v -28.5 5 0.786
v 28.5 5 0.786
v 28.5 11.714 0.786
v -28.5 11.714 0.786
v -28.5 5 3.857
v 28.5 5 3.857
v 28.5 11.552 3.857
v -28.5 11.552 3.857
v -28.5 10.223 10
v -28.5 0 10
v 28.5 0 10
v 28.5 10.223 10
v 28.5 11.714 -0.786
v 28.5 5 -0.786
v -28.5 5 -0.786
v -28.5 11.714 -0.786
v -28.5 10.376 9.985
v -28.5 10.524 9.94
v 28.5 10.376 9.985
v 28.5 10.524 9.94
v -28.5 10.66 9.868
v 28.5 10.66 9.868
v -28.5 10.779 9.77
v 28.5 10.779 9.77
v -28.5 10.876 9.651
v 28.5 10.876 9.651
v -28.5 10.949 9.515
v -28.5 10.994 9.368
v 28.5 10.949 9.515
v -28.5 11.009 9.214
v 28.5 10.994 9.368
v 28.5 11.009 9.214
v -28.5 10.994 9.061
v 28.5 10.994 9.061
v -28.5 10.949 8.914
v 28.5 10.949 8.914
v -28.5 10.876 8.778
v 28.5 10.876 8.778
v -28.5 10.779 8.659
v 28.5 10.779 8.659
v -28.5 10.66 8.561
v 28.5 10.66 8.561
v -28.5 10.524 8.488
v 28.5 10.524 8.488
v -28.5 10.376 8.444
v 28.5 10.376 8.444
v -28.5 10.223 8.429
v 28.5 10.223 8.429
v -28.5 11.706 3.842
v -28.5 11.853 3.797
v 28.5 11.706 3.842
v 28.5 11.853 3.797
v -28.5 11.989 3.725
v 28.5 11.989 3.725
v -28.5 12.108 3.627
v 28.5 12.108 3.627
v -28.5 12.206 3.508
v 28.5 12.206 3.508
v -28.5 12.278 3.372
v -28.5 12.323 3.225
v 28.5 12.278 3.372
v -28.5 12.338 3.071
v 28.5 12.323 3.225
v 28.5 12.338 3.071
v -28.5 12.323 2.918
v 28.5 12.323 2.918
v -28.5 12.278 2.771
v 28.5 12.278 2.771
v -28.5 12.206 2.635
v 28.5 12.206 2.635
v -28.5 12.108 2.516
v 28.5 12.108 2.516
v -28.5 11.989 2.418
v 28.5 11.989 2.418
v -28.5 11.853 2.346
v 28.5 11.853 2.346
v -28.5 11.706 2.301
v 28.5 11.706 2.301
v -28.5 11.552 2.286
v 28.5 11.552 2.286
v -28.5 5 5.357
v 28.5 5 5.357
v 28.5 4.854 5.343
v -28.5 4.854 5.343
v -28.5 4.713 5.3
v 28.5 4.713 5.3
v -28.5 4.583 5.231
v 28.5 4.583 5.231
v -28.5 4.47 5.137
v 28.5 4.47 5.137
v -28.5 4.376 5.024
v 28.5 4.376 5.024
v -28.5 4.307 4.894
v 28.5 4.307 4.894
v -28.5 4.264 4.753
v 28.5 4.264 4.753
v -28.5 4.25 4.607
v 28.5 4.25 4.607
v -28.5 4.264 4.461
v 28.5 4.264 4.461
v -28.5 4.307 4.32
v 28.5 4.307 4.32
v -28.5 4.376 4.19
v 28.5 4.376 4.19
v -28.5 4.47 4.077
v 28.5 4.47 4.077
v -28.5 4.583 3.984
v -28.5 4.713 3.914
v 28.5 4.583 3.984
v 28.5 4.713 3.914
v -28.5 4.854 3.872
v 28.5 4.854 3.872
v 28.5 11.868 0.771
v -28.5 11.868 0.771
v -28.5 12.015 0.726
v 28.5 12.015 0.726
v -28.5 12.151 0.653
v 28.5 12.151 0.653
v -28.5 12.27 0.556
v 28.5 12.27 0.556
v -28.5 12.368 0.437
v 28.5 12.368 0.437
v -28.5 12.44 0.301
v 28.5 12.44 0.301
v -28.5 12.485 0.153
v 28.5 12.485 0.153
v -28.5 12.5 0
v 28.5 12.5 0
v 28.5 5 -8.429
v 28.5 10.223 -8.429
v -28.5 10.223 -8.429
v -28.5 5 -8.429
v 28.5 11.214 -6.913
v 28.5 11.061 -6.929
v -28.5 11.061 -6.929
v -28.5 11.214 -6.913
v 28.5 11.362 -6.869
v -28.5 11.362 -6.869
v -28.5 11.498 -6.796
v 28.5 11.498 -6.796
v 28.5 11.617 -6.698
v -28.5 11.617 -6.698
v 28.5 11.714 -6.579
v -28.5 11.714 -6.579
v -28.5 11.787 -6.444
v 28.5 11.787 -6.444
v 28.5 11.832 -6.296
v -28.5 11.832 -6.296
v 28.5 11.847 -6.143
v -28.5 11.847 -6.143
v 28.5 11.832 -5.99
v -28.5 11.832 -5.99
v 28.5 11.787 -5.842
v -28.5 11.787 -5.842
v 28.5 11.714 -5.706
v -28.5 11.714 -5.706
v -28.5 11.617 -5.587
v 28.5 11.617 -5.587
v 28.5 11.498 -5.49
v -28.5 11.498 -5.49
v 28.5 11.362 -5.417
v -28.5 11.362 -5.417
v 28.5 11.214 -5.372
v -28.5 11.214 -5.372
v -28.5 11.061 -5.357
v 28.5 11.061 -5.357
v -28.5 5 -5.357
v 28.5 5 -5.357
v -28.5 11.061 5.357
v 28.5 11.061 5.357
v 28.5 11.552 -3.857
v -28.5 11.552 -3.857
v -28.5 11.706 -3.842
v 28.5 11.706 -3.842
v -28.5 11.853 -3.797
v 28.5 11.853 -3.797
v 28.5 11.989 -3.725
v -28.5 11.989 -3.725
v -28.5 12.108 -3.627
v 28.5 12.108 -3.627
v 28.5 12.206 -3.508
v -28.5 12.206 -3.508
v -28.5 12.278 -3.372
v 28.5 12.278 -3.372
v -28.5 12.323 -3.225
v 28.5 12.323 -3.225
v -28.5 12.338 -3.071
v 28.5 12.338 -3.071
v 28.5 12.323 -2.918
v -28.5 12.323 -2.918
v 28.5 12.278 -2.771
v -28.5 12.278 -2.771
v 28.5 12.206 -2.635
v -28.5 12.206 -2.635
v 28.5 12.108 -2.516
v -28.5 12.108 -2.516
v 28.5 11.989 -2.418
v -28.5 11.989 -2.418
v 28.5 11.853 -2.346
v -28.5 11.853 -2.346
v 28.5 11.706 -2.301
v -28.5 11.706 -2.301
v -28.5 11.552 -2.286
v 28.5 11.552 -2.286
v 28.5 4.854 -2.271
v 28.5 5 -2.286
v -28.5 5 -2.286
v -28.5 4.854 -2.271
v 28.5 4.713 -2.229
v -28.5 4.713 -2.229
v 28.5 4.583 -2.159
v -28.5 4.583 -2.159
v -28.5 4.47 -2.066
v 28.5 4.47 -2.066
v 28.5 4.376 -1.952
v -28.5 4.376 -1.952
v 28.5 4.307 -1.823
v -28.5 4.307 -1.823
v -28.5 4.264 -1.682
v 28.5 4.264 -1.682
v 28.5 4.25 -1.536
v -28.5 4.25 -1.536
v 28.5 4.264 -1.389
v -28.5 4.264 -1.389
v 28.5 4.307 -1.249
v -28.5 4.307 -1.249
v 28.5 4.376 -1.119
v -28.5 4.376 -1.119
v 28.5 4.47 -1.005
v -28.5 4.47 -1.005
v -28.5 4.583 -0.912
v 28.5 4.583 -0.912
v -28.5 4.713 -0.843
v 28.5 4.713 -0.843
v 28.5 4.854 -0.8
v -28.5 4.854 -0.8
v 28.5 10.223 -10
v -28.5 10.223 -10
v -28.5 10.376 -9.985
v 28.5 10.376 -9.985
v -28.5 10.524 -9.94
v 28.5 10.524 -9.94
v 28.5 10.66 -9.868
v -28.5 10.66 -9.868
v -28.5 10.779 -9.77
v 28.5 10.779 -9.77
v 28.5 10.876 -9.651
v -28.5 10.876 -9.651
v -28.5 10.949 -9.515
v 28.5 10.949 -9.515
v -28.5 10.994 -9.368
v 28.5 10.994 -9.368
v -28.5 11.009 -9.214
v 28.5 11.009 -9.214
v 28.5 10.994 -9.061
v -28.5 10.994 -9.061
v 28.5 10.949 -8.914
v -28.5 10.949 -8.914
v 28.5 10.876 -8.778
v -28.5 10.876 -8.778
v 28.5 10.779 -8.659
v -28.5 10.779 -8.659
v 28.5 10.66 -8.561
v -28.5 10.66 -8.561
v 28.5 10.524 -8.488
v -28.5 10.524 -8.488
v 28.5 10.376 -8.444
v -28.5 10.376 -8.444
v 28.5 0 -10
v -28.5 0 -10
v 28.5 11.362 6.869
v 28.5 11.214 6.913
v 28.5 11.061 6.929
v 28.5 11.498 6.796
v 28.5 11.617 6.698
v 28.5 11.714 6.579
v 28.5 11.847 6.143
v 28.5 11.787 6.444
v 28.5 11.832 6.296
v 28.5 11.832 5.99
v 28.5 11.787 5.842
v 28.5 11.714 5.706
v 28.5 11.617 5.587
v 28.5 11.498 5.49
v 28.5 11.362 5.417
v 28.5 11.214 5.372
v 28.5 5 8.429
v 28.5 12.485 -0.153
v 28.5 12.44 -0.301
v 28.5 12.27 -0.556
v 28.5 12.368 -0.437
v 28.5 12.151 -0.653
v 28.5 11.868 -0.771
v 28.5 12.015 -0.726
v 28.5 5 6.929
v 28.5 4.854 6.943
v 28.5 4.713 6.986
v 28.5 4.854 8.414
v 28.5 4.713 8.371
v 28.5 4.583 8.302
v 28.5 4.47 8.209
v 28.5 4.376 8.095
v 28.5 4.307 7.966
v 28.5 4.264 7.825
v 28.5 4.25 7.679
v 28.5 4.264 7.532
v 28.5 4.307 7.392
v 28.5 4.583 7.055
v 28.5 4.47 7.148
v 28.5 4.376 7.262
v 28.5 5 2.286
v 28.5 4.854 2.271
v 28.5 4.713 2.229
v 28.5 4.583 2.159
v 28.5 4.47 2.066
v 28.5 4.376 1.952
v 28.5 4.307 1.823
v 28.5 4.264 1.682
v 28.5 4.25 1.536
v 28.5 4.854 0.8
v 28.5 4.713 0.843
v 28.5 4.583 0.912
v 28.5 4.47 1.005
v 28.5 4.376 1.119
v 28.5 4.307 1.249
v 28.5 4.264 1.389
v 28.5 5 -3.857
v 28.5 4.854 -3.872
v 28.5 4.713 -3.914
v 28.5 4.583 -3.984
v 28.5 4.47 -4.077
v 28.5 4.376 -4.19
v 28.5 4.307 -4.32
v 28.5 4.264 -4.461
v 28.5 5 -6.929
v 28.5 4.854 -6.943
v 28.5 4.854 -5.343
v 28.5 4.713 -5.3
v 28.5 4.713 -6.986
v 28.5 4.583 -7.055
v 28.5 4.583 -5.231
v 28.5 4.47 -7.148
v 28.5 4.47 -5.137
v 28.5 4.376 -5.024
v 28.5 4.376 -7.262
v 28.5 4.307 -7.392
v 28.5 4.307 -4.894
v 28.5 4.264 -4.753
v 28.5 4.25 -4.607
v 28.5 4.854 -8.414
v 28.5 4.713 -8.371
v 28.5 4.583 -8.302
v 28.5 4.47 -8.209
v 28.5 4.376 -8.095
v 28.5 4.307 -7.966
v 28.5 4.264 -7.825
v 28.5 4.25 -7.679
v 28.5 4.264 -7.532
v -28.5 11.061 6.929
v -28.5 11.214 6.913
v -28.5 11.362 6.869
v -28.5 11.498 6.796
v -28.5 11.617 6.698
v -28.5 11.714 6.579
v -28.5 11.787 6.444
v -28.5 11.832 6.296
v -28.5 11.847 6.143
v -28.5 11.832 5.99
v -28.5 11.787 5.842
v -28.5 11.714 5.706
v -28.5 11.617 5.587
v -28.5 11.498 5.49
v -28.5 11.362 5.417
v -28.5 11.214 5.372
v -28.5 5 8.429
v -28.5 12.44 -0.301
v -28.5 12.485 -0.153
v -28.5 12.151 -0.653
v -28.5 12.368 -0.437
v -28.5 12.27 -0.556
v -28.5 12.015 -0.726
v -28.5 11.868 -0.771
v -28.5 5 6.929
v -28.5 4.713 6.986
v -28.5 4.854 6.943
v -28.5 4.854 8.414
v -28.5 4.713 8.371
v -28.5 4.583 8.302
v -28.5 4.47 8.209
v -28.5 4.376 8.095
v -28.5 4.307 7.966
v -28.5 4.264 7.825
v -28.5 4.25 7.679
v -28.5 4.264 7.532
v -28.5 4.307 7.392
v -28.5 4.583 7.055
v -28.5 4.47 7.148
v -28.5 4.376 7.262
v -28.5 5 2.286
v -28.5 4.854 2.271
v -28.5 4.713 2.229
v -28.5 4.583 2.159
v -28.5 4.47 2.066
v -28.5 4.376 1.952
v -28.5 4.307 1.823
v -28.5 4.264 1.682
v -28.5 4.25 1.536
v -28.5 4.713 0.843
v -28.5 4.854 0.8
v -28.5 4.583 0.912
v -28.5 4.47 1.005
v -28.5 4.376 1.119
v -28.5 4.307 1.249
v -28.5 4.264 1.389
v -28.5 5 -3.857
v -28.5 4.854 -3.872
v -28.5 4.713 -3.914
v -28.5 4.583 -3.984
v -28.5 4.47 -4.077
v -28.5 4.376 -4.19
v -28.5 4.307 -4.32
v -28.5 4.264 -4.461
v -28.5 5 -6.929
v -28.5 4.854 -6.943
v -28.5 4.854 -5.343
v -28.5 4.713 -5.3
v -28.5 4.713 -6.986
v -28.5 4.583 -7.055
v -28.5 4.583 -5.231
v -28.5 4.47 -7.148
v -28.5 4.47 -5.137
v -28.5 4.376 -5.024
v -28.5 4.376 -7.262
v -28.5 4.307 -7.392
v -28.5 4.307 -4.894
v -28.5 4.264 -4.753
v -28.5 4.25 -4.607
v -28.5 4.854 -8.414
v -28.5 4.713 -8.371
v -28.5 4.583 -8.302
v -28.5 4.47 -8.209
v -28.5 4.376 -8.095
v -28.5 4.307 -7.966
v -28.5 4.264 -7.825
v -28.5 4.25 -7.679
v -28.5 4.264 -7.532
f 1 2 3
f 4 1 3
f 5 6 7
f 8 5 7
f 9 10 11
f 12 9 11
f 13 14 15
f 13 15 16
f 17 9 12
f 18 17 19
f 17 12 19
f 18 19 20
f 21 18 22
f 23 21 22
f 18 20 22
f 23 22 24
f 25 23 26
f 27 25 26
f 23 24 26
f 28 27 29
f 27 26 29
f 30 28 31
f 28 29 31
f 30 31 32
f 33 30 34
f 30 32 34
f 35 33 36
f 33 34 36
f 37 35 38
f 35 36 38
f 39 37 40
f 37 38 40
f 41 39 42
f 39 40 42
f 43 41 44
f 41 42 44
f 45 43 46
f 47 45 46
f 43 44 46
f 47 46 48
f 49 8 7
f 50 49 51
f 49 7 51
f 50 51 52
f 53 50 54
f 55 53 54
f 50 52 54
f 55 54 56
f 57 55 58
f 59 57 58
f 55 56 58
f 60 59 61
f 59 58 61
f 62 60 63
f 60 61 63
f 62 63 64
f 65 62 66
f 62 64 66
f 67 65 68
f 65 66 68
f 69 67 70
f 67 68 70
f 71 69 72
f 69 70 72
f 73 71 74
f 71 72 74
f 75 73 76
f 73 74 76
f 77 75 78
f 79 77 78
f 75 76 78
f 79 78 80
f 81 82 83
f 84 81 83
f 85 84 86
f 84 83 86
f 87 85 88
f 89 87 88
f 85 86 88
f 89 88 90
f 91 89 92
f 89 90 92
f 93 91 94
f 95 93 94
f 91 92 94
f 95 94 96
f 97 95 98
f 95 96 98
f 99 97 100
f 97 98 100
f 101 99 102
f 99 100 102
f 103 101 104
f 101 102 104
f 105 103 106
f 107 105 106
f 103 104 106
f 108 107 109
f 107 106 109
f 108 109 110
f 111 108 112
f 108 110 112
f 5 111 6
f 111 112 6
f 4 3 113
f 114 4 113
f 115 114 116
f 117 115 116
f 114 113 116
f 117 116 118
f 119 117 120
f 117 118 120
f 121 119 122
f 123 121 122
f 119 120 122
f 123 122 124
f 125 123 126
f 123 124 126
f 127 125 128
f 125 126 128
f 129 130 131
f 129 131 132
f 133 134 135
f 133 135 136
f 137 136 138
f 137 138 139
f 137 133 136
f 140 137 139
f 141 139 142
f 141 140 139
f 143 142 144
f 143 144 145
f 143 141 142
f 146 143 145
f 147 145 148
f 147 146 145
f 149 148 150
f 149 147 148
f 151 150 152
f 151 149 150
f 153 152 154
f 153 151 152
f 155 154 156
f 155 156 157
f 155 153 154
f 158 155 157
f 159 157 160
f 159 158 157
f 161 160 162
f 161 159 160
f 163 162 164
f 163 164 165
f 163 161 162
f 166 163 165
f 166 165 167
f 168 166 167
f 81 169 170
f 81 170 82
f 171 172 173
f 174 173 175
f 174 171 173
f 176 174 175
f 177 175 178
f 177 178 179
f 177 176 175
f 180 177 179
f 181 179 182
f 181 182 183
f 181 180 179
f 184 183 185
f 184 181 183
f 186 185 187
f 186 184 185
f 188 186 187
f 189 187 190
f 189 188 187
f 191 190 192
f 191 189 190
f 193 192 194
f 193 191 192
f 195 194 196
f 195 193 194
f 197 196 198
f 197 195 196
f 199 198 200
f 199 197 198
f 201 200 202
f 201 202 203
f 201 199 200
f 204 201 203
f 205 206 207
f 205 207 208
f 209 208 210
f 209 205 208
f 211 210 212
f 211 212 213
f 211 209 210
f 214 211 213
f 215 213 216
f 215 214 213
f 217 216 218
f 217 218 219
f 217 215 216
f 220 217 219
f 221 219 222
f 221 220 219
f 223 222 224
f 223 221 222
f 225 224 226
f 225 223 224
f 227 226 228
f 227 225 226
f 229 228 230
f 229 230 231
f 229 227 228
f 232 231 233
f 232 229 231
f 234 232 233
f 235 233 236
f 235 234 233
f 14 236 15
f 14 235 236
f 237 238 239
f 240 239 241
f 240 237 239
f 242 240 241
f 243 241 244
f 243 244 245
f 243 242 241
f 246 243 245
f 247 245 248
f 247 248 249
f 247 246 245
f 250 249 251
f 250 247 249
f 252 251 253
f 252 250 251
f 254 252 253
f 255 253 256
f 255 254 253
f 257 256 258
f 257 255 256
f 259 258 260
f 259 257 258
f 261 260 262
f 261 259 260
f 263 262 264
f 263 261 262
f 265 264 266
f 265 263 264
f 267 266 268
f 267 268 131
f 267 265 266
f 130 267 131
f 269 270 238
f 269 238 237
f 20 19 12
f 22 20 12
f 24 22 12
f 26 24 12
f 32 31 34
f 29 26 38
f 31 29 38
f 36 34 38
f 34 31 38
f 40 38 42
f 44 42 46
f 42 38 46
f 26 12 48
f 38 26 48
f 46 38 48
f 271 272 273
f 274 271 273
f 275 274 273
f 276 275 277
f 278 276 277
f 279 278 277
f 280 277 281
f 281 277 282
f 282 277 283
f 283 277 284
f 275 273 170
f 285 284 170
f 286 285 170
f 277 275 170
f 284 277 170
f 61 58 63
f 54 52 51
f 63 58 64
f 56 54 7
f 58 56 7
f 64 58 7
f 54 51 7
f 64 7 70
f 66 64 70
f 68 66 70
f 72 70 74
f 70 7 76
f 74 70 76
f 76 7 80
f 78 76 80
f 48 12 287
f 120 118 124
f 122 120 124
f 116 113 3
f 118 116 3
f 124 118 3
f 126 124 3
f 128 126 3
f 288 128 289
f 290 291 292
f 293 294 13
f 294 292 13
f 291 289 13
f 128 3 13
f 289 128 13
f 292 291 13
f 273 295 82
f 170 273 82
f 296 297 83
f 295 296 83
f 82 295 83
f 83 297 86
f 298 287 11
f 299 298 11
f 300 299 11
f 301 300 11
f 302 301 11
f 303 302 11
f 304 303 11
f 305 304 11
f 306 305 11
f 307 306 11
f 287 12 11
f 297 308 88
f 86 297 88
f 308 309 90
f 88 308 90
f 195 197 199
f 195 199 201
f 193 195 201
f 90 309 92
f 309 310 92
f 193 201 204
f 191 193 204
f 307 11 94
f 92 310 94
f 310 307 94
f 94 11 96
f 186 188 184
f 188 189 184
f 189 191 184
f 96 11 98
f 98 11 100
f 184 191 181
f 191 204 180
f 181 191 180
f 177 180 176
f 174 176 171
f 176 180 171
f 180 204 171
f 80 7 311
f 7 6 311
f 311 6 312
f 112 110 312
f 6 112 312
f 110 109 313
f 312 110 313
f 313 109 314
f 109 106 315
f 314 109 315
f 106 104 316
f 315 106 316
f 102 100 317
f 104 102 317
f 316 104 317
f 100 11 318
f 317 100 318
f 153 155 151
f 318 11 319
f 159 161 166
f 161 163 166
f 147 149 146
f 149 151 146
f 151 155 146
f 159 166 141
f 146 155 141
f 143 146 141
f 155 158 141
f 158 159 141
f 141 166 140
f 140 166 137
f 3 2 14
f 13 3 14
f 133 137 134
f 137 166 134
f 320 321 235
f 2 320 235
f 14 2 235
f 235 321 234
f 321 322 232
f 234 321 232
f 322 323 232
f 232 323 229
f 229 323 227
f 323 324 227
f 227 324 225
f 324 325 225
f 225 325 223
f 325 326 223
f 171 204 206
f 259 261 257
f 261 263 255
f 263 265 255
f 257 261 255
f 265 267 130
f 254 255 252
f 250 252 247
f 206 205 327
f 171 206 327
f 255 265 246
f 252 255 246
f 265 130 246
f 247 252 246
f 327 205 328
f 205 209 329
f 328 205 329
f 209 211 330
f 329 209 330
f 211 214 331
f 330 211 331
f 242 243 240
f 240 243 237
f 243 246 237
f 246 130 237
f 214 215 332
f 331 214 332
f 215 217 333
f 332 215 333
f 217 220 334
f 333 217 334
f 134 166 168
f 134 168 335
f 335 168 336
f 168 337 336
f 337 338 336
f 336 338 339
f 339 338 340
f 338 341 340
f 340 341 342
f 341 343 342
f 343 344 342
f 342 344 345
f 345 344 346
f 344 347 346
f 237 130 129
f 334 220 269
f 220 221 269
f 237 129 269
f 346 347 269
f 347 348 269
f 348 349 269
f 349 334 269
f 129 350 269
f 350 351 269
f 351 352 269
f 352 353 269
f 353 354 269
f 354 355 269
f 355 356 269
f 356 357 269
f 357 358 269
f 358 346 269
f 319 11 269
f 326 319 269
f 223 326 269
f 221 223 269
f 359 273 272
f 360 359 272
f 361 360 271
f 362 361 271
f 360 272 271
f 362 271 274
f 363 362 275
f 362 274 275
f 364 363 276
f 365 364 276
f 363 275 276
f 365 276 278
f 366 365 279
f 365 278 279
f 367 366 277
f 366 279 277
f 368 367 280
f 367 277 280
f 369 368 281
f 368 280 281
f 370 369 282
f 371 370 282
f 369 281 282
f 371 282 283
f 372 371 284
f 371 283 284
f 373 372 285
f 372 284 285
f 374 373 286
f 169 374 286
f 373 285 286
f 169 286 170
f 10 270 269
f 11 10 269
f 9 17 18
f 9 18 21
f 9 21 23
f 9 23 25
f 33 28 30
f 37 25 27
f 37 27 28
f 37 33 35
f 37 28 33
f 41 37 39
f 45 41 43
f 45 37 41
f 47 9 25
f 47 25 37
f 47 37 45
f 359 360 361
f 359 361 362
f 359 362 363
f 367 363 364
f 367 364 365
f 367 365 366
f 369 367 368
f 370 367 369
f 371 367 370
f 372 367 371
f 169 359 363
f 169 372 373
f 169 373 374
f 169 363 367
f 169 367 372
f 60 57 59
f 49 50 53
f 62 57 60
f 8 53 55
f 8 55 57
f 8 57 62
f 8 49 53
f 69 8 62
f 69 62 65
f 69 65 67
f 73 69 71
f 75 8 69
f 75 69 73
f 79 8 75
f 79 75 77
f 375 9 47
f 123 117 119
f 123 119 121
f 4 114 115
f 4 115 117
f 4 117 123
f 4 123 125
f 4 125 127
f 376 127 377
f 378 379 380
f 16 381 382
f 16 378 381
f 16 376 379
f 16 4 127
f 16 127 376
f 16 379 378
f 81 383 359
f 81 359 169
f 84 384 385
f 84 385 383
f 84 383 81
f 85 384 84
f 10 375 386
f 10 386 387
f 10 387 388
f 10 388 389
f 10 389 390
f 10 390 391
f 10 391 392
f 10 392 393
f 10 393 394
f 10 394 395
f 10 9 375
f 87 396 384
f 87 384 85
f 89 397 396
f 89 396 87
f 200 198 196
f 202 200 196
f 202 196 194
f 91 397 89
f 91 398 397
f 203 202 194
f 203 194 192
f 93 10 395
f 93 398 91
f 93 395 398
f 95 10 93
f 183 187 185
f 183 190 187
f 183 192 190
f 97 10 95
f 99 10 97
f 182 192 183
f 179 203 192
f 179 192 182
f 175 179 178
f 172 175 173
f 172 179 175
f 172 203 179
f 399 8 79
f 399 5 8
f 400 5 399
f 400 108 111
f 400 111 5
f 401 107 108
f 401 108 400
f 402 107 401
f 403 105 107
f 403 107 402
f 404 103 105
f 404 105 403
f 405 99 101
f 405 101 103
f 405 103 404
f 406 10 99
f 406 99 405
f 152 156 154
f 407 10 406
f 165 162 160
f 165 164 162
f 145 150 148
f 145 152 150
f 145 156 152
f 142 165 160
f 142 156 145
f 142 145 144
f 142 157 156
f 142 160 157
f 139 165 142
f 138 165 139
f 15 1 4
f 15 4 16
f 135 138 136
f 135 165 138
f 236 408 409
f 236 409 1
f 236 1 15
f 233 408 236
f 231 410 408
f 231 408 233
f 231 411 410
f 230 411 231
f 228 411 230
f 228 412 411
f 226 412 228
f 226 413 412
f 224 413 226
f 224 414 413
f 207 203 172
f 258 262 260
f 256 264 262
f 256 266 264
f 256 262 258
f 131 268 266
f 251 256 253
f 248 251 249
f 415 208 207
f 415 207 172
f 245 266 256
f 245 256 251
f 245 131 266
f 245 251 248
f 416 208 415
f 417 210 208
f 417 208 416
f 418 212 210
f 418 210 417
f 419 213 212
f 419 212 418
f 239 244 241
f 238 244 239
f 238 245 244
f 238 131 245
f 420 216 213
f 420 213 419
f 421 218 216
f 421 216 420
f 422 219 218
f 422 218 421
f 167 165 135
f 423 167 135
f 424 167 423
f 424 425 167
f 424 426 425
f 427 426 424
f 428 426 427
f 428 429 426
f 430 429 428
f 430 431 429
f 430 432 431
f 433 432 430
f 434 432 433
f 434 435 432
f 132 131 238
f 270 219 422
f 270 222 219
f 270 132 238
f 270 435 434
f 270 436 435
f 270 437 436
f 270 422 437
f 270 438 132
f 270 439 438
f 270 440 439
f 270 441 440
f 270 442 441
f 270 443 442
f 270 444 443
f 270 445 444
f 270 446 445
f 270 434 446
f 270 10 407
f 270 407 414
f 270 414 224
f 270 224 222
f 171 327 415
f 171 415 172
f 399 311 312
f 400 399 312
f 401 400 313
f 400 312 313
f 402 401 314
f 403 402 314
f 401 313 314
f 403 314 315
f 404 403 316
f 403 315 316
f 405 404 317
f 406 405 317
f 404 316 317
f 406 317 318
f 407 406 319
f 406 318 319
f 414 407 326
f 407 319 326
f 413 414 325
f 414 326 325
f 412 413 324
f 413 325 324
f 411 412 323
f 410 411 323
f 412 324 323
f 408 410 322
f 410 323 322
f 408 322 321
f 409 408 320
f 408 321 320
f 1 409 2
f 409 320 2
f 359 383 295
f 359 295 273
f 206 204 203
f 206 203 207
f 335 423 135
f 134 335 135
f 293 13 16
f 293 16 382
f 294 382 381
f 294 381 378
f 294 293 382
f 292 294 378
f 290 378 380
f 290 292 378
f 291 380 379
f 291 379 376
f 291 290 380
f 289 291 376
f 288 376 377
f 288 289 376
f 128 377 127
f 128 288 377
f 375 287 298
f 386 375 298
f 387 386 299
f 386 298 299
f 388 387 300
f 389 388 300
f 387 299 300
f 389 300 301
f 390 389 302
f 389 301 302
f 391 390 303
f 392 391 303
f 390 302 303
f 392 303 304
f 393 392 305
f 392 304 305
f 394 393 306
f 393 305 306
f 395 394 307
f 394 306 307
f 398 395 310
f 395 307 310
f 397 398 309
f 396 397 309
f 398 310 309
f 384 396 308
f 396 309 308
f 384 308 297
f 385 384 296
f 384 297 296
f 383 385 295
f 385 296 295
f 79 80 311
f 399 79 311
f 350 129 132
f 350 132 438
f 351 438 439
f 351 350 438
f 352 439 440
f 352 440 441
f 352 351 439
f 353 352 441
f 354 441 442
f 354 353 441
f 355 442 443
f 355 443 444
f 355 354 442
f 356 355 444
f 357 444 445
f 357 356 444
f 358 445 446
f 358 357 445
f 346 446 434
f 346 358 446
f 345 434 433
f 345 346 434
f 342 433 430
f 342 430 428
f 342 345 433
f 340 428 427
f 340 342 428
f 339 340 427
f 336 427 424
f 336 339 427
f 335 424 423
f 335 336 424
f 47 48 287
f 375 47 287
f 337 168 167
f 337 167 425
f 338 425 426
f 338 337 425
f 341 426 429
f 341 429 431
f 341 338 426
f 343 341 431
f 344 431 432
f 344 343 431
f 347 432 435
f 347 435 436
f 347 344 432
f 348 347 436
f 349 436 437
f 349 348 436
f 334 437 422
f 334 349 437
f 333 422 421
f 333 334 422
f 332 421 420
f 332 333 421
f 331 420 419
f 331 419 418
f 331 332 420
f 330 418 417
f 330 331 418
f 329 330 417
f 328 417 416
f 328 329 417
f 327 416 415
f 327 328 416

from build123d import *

# Parameters (mm, degrees)
SKETCH2_W           = 57
SKETCH2_H           = 20
BOSS_EXTRUDE1_DEPTH = 12.5
CUT_EXTRUDE1_DEPTH  = 57


with BuildPart() as part:
    # Sketch2 → Boss-Extrude1 (new body)
    with BuildSketch(Plane(origin=(0, 0, 0), x_dir=(1, 0, 0), z_dir=(0, 1, 0))):
        Rectangle(SKETCH2_W, SKETCH2_H)
    extrude(amount=BOSS_EXTRUDE1_DEPTH)

    # Sketch3 → Cut-Extrude1 (cut)
    with BuildSketch(Plane(origin=(28.5, 0, 0), x_dir=(0, 0, -1), z_dir=(1, 0, 0))):
        with BuildLine():
            Line((-10, 12.5), (-10, 10.22312083))
            ThreePointArc((-10, 10.22312083), (-9.214285714, 11.008835116), (-8.428571429, 10.22312083))
            Line((-8.428571429, 10.22312083), (-8.428571429, 5))
            ThreePointArc((-8.428571429, 5), (-7.678571429, 4.25), (-6.928571429, 5))
            Line((-6.928571429, 5), (-6.928571429, 11.061158869))
            ThreePointArc((-6.928571429, 11.061158869), (-6.142857143, 11.846873154), (-5.357142857, 11.061158869))
            Line((-5.357142857, 11.061158869), (-5.357142857, 5))
            ThreePointArc((-5.357142857, 5), (-4.607142857, 4.25), (-3.857142857, 5))
            Line((-3.857142857, 5), (-3.857142857, 11.552380562))
            ThreePointArc((-3.857142857, 11.552380562), (-3.071428571, 12.338094848), (-2.285714286, 11.552380562))
            Line((-2.285714286, 11.552380562), (-2.285714286, 5))
            ThreePointArc((-2.285714286, 5), (-1.535714286, 4.25), (-0.785714286, 5))
            Line((-0.785714286, 5), (-0.785714286, 11.714285714))
            ThreePointArc((-0.785714286, 11.714285714), (-0.5555839, 12.269869614), (0, 12.5))
            Line((0, 12.5), (-10, 12.5))
        make_face()
    cut_extrude1 = extrude(amount=-CUT_EXTRUDE1_DEPTH, mode=Mode.SUBTRACT)

    # Mirror1: Cut-Extrude1 across plane
    add(cut_extrude1.mirror(Plane.XY), mode=Mode.SUBTRACT)


solid = part.part
